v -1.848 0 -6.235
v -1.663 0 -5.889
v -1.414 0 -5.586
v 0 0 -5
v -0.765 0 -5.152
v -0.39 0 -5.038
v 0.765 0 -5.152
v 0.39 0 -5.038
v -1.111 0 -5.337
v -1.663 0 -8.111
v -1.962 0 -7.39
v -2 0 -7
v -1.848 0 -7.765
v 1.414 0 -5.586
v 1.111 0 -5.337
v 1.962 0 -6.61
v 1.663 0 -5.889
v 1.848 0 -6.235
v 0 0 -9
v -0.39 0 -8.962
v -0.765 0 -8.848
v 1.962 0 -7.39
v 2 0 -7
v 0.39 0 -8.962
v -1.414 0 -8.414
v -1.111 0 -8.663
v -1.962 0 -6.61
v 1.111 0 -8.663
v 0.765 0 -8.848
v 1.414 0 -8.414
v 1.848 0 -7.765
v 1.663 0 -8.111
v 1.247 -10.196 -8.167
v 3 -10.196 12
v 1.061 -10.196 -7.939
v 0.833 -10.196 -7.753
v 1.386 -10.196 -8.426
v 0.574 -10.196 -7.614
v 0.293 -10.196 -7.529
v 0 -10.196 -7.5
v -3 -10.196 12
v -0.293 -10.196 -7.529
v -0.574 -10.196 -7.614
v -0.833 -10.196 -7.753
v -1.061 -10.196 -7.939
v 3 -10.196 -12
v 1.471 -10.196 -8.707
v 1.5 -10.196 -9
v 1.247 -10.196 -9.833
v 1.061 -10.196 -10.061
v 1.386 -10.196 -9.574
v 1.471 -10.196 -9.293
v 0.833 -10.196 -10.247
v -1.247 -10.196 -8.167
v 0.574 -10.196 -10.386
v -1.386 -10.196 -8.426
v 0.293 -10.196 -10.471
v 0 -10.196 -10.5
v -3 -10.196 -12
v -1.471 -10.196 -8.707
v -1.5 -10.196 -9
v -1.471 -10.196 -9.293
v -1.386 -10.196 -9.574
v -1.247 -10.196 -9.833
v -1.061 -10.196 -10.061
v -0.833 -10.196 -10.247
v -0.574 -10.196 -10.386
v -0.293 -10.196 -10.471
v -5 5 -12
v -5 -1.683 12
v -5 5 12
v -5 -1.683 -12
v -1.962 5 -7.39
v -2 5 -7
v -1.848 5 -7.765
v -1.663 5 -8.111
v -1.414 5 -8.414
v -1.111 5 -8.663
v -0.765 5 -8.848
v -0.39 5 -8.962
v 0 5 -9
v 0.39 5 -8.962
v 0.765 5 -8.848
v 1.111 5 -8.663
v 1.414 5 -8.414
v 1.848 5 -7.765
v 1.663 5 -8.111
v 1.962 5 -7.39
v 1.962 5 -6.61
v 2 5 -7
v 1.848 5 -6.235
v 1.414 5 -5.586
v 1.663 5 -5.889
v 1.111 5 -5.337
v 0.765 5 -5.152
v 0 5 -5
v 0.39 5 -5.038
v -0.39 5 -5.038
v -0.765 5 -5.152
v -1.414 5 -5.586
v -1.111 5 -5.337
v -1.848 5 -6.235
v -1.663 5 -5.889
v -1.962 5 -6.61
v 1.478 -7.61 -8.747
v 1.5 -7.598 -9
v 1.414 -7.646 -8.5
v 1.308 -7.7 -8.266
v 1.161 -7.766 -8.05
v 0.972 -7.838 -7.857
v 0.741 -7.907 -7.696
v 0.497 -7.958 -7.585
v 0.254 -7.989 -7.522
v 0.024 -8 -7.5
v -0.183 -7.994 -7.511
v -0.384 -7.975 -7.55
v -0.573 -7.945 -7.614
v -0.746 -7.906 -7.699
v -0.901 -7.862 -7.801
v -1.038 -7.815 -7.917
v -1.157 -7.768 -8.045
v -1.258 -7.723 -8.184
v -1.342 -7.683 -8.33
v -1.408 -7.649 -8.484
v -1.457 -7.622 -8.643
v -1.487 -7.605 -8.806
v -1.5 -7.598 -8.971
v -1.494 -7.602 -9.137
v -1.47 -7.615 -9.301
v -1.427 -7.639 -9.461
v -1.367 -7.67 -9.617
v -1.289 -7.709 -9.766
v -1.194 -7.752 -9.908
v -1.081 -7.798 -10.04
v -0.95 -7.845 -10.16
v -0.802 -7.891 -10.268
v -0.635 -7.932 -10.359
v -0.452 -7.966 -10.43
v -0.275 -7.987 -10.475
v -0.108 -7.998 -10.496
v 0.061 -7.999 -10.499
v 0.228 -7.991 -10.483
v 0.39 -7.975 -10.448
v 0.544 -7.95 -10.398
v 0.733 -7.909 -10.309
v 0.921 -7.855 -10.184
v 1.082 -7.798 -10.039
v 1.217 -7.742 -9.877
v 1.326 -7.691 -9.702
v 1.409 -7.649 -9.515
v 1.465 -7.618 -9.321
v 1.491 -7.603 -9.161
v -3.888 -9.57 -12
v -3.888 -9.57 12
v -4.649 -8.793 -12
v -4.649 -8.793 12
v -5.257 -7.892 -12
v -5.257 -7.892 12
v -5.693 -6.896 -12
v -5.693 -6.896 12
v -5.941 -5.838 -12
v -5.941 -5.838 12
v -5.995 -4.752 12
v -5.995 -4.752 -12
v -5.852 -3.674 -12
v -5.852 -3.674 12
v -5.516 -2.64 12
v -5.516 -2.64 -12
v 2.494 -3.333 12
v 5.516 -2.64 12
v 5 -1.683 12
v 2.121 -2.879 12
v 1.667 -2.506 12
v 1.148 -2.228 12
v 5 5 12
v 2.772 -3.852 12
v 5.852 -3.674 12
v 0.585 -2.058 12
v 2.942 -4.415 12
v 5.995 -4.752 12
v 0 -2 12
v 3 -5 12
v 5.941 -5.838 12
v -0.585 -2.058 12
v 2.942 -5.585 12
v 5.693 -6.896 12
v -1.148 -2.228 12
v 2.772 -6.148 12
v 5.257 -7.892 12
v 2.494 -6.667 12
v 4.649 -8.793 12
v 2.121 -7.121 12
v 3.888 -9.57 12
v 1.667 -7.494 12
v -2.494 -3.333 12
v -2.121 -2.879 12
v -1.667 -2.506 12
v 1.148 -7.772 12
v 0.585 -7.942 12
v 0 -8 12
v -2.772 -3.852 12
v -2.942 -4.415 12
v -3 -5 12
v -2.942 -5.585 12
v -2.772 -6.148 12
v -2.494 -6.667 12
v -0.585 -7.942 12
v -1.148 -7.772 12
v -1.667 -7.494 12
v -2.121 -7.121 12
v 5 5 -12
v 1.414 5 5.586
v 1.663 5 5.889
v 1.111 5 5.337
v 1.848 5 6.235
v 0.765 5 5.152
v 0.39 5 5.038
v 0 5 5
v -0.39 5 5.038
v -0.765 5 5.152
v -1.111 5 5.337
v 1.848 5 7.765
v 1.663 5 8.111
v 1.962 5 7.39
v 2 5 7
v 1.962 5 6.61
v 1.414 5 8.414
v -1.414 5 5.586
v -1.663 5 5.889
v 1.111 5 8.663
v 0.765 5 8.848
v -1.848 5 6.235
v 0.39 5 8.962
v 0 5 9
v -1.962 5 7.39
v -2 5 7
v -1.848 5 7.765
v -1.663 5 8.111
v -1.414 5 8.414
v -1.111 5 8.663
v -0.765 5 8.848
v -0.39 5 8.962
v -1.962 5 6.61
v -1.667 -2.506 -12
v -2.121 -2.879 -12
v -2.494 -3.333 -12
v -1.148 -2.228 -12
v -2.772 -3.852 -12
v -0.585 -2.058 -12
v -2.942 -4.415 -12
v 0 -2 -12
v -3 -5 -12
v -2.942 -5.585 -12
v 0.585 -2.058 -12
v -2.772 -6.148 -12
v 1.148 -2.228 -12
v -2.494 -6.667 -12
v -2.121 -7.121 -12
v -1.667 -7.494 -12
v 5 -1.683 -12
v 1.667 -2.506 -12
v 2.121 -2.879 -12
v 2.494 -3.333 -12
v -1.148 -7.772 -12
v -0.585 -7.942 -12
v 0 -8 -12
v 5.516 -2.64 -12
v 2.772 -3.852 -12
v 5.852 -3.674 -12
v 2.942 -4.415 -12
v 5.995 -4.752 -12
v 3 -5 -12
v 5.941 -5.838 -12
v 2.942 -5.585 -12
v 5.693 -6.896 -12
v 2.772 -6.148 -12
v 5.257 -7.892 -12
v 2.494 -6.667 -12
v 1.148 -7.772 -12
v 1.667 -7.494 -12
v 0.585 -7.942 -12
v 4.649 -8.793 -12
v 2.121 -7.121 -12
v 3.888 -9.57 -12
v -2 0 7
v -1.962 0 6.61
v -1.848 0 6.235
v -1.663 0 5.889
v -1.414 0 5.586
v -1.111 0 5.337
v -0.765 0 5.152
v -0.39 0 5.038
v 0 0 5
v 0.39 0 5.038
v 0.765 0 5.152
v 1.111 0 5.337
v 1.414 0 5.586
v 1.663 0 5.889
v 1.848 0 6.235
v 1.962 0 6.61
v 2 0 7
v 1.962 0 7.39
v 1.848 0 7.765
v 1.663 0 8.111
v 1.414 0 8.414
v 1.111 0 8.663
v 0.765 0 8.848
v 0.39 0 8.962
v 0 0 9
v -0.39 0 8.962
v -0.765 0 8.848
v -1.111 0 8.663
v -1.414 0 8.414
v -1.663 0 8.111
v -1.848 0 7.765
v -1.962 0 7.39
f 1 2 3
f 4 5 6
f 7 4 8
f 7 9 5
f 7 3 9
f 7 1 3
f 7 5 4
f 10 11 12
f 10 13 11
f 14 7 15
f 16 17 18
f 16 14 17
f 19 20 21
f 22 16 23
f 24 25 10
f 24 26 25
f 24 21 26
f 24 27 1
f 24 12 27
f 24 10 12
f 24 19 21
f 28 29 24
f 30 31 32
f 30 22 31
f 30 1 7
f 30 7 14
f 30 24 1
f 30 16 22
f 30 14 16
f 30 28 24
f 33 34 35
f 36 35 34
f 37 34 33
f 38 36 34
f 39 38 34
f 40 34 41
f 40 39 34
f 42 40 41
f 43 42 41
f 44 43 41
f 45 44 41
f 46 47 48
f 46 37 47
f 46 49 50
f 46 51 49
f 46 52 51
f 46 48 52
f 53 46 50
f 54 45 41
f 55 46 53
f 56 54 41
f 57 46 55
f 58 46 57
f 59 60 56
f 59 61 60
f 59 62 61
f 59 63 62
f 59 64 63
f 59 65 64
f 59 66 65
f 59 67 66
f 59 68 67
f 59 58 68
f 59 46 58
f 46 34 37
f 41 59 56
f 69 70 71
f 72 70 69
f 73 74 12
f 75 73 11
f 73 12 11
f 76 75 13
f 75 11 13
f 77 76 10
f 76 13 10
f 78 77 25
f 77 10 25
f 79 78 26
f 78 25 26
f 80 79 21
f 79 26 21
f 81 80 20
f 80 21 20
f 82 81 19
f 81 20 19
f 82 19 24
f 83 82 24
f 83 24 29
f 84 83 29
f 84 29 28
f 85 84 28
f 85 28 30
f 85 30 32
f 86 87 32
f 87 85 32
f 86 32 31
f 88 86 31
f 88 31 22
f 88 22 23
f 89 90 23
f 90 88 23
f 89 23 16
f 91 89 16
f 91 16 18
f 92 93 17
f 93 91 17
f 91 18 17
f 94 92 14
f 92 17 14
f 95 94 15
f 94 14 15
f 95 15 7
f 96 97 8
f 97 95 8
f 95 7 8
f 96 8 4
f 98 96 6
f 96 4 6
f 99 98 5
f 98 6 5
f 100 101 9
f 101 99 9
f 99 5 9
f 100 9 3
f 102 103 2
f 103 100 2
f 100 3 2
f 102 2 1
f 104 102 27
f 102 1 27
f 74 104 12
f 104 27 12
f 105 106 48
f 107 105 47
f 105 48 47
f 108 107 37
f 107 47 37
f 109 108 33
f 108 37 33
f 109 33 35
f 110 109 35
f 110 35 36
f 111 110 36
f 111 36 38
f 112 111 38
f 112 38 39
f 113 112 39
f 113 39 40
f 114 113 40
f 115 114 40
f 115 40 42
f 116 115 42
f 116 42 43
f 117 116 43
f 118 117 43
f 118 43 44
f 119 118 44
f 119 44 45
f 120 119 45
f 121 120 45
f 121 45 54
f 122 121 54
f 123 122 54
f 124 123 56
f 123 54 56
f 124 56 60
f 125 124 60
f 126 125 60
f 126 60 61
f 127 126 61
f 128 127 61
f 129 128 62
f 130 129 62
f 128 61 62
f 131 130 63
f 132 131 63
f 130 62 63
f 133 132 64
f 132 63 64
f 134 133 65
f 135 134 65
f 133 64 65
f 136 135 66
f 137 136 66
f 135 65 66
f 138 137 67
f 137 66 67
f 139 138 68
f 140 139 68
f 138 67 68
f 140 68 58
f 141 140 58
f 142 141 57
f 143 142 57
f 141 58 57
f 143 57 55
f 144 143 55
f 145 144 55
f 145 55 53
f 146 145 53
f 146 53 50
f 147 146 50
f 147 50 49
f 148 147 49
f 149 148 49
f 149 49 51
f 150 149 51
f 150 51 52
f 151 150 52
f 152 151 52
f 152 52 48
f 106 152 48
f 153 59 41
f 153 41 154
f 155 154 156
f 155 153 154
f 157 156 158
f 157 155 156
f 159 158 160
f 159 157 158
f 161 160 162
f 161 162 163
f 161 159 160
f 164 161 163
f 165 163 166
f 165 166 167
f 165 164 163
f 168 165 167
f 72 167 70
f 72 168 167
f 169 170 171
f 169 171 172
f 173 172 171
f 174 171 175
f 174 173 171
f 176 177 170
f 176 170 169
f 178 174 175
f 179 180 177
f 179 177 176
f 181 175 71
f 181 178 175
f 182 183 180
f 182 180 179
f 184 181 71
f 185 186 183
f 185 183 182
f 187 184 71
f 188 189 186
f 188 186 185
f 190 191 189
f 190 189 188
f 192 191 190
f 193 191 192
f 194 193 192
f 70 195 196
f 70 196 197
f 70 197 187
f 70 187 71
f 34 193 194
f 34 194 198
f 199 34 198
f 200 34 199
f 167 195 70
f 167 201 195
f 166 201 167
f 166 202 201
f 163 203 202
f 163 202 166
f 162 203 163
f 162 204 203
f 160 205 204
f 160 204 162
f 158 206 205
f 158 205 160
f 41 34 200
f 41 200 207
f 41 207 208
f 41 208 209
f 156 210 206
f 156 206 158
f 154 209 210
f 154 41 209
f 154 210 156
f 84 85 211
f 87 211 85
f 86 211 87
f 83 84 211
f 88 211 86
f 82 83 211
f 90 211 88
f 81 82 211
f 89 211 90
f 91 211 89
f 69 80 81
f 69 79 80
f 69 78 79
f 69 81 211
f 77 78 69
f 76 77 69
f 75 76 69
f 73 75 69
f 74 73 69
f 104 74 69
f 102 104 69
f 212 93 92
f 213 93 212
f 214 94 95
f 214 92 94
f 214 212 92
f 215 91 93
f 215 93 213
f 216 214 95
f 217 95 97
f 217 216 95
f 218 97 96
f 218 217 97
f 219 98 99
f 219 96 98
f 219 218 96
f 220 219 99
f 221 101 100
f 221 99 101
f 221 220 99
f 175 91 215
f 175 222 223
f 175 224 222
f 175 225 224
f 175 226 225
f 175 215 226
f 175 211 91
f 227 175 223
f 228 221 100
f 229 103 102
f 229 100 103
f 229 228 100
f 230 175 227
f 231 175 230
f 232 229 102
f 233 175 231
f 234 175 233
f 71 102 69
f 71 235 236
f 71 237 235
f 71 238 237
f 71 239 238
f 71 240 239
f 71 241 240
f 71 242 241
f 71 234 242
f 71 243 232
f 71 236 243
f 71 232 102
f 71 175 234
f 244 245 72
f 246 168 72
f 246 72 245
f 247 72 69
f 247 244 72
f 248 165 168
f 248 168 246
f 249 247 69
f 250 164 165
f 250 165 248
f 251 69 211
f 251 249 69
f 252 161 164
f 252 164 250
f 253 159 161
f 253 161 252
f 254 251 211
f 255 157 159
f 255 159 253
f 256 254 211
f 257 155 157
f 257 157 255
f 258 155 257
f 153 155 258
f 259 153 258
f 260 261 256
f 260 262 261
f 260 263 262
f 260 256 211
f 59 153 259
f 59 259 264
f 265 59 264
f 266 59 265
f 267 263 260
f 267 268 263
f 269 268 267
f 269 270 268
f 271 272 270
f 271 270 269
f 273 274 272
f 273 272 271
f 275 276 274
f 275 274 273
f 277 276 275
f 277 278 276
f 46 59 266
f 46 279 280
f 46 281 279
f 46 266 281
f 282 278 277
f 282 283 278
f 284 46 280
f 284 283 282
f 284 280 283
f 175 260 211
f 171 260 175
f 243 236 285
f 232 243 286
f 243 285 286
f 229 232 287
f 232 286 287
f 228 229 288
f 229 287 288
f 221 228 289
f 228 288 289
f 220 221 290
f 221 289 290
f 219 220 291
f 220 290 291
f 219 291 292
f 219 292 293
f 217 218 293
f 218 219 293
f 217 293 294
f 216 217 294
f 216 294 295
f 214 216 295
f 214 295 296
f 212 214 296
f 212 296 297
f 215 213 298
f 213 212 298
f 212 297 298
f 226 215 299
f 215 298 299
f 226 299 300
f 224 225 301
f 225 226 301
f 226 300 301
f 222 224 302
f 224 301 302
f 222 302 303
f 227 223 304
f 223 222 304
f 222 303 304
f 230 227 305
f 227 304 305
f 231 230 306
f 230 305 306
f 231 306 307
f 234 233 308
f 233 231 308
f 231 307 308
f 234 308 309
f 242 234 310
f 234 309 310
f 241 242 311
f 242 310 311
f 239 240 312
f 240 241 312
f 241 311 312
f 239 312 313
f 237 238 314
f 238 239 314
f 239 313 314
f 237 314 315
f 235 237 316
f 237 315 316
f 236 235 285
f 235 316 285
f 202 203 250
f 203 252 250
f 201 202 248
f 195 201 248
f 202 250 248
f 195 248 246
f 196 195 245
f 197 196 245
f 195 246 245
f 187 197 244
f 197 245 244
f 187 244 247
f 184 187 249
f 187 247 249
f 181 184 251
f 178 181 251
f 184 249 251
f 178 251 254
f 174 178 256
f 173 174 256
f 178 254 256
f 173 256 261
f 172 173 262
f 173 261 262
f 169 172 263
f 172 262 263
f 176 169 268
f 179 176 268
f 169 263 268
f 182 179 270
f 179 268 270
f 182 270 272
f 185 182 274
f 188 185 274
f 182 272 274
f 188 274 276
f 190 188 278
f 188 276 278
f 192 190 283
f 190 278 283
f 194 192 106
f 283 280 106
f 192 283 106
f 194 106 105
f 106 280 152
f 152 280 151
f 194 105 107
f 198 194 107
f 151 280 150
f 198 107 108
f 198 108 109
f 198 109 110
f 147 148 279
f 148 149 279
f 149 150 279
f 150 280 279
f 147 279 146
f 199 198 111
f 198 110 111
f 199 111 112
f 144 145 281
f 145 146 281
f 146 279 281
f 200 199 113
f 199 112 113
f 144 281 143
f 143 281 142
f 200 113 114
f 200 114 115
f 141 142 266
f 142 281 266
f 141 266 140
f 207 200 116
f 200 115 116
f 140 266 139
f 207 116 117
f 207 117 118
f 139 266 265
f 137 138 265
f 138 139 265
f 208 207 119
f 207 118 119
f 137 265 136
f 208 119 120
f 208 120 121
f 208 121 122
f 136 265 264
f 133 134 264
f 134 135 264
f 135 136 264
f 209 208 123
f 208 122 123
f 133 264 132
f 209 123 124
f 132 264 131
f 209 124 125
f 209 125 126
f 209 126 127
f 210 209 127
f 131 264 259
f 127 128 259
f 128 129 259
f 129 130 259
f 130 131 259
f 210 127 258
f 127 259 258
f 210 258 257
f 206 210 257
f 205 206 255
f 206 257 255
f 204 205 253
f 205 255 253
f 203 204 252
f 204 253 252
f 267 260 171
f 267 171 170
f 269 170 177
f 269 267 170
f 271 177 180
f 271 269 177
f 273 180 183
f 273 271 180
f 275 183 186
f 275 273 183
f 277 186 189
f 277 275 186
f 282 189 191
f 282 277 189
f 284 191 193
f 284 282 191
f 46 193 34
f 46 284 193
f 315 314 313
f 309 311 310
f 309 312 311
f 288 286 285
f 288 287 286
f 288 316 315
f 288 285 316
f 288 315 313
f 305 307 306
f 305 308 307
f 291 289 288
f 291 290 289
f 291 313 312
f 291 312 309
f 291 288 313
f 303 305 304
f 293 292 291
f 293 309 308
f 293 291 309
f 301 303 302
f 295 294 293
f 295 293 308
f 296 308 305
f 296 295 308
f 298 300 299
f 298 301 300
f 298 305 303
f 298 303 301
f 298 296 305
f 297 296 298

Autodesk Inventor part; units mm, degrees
ref_plane "YZ Plane" through (0, 0, 0) normal (1, 0, 0) x (0, 1, 0)
ref_plane "XZ Plane" through (0, 0, 0) normal (0, 1, 0) x (-1, 0, 0)
ref_plane "XY Plane" through (0, 0, 0) normal (0, 0, 1) x (1, 0, 0)
sketch "Sketch1" plane through (0, 0, 0) normal (0, 1, 0) x (-1, 0, 0)
  circle A0 centre (0, 7) radius 2
  circle A1 centre (0, -7) radius 2
  line L0 (0, 7) -> (0, -7)
  line L1 (5, -12) -> (-5, -12)
  line L2 (-5, -12) -> (-5, 12)
  line L3 (-5, 12) -> (5, 12)
  line L4 (5, 12) -> (5, -12)
  point P0 (0, 0)
  point P1 (0, 0)
  point P2 (-5, 0)
  point P3 (0, -12)
  dimension "d0" = 4
  dimension "d1" = 4
  dimension "d2" = 14
  dimension "d3" = 10
  dimension "d4" = 24
extrude "Extrusion1" add sketch "Sketch1" along normal blind 5
sketch "Sketch2" plane through (5, 0, -12) normal (0, 0, -1) x (-1, 0, 0)
  circle A0 centre (5, -5) radius 6
  circle A1 centre (5, -5) radius 3
  line L0 (0, 0) -> (0, 5) projected
  line L1 (10, 0) -> (0, 0) projected
  line L2 (0, 0) -> (0, -1.6834)
  line L3 (10, 0) -> (10, -1.6834)
  line L4 (2, -10.1962) -> (8, -10.1962)
  point P0 (5, 0)
  dimension "d7" = 6
  dimension "d8" = 5
  dimension "d9" = 5
  dimension "d10" = 12
  dimension "d11" = 6
extrude "Extrusion2" add sketch "Sketch2" against normal blind 24 contours A0 L4 L1 | A0 L1 L3 | A0 L2 L1
sketch "Sketch3" plane through (-3, -10.1962, -12) normal (0, -1, 0) x (1, 0, 0)
  circle A0 centre (3, 3) radius 1.5
  line L0 (3, 3) -> (3, 12) construction
  dimension "d14" = 3
  dimension "d15" = 9
extrude "Extrusion3" cut sketch "Sketch3" against normal blind 6.25
properties part number "Metal_Bushing"
